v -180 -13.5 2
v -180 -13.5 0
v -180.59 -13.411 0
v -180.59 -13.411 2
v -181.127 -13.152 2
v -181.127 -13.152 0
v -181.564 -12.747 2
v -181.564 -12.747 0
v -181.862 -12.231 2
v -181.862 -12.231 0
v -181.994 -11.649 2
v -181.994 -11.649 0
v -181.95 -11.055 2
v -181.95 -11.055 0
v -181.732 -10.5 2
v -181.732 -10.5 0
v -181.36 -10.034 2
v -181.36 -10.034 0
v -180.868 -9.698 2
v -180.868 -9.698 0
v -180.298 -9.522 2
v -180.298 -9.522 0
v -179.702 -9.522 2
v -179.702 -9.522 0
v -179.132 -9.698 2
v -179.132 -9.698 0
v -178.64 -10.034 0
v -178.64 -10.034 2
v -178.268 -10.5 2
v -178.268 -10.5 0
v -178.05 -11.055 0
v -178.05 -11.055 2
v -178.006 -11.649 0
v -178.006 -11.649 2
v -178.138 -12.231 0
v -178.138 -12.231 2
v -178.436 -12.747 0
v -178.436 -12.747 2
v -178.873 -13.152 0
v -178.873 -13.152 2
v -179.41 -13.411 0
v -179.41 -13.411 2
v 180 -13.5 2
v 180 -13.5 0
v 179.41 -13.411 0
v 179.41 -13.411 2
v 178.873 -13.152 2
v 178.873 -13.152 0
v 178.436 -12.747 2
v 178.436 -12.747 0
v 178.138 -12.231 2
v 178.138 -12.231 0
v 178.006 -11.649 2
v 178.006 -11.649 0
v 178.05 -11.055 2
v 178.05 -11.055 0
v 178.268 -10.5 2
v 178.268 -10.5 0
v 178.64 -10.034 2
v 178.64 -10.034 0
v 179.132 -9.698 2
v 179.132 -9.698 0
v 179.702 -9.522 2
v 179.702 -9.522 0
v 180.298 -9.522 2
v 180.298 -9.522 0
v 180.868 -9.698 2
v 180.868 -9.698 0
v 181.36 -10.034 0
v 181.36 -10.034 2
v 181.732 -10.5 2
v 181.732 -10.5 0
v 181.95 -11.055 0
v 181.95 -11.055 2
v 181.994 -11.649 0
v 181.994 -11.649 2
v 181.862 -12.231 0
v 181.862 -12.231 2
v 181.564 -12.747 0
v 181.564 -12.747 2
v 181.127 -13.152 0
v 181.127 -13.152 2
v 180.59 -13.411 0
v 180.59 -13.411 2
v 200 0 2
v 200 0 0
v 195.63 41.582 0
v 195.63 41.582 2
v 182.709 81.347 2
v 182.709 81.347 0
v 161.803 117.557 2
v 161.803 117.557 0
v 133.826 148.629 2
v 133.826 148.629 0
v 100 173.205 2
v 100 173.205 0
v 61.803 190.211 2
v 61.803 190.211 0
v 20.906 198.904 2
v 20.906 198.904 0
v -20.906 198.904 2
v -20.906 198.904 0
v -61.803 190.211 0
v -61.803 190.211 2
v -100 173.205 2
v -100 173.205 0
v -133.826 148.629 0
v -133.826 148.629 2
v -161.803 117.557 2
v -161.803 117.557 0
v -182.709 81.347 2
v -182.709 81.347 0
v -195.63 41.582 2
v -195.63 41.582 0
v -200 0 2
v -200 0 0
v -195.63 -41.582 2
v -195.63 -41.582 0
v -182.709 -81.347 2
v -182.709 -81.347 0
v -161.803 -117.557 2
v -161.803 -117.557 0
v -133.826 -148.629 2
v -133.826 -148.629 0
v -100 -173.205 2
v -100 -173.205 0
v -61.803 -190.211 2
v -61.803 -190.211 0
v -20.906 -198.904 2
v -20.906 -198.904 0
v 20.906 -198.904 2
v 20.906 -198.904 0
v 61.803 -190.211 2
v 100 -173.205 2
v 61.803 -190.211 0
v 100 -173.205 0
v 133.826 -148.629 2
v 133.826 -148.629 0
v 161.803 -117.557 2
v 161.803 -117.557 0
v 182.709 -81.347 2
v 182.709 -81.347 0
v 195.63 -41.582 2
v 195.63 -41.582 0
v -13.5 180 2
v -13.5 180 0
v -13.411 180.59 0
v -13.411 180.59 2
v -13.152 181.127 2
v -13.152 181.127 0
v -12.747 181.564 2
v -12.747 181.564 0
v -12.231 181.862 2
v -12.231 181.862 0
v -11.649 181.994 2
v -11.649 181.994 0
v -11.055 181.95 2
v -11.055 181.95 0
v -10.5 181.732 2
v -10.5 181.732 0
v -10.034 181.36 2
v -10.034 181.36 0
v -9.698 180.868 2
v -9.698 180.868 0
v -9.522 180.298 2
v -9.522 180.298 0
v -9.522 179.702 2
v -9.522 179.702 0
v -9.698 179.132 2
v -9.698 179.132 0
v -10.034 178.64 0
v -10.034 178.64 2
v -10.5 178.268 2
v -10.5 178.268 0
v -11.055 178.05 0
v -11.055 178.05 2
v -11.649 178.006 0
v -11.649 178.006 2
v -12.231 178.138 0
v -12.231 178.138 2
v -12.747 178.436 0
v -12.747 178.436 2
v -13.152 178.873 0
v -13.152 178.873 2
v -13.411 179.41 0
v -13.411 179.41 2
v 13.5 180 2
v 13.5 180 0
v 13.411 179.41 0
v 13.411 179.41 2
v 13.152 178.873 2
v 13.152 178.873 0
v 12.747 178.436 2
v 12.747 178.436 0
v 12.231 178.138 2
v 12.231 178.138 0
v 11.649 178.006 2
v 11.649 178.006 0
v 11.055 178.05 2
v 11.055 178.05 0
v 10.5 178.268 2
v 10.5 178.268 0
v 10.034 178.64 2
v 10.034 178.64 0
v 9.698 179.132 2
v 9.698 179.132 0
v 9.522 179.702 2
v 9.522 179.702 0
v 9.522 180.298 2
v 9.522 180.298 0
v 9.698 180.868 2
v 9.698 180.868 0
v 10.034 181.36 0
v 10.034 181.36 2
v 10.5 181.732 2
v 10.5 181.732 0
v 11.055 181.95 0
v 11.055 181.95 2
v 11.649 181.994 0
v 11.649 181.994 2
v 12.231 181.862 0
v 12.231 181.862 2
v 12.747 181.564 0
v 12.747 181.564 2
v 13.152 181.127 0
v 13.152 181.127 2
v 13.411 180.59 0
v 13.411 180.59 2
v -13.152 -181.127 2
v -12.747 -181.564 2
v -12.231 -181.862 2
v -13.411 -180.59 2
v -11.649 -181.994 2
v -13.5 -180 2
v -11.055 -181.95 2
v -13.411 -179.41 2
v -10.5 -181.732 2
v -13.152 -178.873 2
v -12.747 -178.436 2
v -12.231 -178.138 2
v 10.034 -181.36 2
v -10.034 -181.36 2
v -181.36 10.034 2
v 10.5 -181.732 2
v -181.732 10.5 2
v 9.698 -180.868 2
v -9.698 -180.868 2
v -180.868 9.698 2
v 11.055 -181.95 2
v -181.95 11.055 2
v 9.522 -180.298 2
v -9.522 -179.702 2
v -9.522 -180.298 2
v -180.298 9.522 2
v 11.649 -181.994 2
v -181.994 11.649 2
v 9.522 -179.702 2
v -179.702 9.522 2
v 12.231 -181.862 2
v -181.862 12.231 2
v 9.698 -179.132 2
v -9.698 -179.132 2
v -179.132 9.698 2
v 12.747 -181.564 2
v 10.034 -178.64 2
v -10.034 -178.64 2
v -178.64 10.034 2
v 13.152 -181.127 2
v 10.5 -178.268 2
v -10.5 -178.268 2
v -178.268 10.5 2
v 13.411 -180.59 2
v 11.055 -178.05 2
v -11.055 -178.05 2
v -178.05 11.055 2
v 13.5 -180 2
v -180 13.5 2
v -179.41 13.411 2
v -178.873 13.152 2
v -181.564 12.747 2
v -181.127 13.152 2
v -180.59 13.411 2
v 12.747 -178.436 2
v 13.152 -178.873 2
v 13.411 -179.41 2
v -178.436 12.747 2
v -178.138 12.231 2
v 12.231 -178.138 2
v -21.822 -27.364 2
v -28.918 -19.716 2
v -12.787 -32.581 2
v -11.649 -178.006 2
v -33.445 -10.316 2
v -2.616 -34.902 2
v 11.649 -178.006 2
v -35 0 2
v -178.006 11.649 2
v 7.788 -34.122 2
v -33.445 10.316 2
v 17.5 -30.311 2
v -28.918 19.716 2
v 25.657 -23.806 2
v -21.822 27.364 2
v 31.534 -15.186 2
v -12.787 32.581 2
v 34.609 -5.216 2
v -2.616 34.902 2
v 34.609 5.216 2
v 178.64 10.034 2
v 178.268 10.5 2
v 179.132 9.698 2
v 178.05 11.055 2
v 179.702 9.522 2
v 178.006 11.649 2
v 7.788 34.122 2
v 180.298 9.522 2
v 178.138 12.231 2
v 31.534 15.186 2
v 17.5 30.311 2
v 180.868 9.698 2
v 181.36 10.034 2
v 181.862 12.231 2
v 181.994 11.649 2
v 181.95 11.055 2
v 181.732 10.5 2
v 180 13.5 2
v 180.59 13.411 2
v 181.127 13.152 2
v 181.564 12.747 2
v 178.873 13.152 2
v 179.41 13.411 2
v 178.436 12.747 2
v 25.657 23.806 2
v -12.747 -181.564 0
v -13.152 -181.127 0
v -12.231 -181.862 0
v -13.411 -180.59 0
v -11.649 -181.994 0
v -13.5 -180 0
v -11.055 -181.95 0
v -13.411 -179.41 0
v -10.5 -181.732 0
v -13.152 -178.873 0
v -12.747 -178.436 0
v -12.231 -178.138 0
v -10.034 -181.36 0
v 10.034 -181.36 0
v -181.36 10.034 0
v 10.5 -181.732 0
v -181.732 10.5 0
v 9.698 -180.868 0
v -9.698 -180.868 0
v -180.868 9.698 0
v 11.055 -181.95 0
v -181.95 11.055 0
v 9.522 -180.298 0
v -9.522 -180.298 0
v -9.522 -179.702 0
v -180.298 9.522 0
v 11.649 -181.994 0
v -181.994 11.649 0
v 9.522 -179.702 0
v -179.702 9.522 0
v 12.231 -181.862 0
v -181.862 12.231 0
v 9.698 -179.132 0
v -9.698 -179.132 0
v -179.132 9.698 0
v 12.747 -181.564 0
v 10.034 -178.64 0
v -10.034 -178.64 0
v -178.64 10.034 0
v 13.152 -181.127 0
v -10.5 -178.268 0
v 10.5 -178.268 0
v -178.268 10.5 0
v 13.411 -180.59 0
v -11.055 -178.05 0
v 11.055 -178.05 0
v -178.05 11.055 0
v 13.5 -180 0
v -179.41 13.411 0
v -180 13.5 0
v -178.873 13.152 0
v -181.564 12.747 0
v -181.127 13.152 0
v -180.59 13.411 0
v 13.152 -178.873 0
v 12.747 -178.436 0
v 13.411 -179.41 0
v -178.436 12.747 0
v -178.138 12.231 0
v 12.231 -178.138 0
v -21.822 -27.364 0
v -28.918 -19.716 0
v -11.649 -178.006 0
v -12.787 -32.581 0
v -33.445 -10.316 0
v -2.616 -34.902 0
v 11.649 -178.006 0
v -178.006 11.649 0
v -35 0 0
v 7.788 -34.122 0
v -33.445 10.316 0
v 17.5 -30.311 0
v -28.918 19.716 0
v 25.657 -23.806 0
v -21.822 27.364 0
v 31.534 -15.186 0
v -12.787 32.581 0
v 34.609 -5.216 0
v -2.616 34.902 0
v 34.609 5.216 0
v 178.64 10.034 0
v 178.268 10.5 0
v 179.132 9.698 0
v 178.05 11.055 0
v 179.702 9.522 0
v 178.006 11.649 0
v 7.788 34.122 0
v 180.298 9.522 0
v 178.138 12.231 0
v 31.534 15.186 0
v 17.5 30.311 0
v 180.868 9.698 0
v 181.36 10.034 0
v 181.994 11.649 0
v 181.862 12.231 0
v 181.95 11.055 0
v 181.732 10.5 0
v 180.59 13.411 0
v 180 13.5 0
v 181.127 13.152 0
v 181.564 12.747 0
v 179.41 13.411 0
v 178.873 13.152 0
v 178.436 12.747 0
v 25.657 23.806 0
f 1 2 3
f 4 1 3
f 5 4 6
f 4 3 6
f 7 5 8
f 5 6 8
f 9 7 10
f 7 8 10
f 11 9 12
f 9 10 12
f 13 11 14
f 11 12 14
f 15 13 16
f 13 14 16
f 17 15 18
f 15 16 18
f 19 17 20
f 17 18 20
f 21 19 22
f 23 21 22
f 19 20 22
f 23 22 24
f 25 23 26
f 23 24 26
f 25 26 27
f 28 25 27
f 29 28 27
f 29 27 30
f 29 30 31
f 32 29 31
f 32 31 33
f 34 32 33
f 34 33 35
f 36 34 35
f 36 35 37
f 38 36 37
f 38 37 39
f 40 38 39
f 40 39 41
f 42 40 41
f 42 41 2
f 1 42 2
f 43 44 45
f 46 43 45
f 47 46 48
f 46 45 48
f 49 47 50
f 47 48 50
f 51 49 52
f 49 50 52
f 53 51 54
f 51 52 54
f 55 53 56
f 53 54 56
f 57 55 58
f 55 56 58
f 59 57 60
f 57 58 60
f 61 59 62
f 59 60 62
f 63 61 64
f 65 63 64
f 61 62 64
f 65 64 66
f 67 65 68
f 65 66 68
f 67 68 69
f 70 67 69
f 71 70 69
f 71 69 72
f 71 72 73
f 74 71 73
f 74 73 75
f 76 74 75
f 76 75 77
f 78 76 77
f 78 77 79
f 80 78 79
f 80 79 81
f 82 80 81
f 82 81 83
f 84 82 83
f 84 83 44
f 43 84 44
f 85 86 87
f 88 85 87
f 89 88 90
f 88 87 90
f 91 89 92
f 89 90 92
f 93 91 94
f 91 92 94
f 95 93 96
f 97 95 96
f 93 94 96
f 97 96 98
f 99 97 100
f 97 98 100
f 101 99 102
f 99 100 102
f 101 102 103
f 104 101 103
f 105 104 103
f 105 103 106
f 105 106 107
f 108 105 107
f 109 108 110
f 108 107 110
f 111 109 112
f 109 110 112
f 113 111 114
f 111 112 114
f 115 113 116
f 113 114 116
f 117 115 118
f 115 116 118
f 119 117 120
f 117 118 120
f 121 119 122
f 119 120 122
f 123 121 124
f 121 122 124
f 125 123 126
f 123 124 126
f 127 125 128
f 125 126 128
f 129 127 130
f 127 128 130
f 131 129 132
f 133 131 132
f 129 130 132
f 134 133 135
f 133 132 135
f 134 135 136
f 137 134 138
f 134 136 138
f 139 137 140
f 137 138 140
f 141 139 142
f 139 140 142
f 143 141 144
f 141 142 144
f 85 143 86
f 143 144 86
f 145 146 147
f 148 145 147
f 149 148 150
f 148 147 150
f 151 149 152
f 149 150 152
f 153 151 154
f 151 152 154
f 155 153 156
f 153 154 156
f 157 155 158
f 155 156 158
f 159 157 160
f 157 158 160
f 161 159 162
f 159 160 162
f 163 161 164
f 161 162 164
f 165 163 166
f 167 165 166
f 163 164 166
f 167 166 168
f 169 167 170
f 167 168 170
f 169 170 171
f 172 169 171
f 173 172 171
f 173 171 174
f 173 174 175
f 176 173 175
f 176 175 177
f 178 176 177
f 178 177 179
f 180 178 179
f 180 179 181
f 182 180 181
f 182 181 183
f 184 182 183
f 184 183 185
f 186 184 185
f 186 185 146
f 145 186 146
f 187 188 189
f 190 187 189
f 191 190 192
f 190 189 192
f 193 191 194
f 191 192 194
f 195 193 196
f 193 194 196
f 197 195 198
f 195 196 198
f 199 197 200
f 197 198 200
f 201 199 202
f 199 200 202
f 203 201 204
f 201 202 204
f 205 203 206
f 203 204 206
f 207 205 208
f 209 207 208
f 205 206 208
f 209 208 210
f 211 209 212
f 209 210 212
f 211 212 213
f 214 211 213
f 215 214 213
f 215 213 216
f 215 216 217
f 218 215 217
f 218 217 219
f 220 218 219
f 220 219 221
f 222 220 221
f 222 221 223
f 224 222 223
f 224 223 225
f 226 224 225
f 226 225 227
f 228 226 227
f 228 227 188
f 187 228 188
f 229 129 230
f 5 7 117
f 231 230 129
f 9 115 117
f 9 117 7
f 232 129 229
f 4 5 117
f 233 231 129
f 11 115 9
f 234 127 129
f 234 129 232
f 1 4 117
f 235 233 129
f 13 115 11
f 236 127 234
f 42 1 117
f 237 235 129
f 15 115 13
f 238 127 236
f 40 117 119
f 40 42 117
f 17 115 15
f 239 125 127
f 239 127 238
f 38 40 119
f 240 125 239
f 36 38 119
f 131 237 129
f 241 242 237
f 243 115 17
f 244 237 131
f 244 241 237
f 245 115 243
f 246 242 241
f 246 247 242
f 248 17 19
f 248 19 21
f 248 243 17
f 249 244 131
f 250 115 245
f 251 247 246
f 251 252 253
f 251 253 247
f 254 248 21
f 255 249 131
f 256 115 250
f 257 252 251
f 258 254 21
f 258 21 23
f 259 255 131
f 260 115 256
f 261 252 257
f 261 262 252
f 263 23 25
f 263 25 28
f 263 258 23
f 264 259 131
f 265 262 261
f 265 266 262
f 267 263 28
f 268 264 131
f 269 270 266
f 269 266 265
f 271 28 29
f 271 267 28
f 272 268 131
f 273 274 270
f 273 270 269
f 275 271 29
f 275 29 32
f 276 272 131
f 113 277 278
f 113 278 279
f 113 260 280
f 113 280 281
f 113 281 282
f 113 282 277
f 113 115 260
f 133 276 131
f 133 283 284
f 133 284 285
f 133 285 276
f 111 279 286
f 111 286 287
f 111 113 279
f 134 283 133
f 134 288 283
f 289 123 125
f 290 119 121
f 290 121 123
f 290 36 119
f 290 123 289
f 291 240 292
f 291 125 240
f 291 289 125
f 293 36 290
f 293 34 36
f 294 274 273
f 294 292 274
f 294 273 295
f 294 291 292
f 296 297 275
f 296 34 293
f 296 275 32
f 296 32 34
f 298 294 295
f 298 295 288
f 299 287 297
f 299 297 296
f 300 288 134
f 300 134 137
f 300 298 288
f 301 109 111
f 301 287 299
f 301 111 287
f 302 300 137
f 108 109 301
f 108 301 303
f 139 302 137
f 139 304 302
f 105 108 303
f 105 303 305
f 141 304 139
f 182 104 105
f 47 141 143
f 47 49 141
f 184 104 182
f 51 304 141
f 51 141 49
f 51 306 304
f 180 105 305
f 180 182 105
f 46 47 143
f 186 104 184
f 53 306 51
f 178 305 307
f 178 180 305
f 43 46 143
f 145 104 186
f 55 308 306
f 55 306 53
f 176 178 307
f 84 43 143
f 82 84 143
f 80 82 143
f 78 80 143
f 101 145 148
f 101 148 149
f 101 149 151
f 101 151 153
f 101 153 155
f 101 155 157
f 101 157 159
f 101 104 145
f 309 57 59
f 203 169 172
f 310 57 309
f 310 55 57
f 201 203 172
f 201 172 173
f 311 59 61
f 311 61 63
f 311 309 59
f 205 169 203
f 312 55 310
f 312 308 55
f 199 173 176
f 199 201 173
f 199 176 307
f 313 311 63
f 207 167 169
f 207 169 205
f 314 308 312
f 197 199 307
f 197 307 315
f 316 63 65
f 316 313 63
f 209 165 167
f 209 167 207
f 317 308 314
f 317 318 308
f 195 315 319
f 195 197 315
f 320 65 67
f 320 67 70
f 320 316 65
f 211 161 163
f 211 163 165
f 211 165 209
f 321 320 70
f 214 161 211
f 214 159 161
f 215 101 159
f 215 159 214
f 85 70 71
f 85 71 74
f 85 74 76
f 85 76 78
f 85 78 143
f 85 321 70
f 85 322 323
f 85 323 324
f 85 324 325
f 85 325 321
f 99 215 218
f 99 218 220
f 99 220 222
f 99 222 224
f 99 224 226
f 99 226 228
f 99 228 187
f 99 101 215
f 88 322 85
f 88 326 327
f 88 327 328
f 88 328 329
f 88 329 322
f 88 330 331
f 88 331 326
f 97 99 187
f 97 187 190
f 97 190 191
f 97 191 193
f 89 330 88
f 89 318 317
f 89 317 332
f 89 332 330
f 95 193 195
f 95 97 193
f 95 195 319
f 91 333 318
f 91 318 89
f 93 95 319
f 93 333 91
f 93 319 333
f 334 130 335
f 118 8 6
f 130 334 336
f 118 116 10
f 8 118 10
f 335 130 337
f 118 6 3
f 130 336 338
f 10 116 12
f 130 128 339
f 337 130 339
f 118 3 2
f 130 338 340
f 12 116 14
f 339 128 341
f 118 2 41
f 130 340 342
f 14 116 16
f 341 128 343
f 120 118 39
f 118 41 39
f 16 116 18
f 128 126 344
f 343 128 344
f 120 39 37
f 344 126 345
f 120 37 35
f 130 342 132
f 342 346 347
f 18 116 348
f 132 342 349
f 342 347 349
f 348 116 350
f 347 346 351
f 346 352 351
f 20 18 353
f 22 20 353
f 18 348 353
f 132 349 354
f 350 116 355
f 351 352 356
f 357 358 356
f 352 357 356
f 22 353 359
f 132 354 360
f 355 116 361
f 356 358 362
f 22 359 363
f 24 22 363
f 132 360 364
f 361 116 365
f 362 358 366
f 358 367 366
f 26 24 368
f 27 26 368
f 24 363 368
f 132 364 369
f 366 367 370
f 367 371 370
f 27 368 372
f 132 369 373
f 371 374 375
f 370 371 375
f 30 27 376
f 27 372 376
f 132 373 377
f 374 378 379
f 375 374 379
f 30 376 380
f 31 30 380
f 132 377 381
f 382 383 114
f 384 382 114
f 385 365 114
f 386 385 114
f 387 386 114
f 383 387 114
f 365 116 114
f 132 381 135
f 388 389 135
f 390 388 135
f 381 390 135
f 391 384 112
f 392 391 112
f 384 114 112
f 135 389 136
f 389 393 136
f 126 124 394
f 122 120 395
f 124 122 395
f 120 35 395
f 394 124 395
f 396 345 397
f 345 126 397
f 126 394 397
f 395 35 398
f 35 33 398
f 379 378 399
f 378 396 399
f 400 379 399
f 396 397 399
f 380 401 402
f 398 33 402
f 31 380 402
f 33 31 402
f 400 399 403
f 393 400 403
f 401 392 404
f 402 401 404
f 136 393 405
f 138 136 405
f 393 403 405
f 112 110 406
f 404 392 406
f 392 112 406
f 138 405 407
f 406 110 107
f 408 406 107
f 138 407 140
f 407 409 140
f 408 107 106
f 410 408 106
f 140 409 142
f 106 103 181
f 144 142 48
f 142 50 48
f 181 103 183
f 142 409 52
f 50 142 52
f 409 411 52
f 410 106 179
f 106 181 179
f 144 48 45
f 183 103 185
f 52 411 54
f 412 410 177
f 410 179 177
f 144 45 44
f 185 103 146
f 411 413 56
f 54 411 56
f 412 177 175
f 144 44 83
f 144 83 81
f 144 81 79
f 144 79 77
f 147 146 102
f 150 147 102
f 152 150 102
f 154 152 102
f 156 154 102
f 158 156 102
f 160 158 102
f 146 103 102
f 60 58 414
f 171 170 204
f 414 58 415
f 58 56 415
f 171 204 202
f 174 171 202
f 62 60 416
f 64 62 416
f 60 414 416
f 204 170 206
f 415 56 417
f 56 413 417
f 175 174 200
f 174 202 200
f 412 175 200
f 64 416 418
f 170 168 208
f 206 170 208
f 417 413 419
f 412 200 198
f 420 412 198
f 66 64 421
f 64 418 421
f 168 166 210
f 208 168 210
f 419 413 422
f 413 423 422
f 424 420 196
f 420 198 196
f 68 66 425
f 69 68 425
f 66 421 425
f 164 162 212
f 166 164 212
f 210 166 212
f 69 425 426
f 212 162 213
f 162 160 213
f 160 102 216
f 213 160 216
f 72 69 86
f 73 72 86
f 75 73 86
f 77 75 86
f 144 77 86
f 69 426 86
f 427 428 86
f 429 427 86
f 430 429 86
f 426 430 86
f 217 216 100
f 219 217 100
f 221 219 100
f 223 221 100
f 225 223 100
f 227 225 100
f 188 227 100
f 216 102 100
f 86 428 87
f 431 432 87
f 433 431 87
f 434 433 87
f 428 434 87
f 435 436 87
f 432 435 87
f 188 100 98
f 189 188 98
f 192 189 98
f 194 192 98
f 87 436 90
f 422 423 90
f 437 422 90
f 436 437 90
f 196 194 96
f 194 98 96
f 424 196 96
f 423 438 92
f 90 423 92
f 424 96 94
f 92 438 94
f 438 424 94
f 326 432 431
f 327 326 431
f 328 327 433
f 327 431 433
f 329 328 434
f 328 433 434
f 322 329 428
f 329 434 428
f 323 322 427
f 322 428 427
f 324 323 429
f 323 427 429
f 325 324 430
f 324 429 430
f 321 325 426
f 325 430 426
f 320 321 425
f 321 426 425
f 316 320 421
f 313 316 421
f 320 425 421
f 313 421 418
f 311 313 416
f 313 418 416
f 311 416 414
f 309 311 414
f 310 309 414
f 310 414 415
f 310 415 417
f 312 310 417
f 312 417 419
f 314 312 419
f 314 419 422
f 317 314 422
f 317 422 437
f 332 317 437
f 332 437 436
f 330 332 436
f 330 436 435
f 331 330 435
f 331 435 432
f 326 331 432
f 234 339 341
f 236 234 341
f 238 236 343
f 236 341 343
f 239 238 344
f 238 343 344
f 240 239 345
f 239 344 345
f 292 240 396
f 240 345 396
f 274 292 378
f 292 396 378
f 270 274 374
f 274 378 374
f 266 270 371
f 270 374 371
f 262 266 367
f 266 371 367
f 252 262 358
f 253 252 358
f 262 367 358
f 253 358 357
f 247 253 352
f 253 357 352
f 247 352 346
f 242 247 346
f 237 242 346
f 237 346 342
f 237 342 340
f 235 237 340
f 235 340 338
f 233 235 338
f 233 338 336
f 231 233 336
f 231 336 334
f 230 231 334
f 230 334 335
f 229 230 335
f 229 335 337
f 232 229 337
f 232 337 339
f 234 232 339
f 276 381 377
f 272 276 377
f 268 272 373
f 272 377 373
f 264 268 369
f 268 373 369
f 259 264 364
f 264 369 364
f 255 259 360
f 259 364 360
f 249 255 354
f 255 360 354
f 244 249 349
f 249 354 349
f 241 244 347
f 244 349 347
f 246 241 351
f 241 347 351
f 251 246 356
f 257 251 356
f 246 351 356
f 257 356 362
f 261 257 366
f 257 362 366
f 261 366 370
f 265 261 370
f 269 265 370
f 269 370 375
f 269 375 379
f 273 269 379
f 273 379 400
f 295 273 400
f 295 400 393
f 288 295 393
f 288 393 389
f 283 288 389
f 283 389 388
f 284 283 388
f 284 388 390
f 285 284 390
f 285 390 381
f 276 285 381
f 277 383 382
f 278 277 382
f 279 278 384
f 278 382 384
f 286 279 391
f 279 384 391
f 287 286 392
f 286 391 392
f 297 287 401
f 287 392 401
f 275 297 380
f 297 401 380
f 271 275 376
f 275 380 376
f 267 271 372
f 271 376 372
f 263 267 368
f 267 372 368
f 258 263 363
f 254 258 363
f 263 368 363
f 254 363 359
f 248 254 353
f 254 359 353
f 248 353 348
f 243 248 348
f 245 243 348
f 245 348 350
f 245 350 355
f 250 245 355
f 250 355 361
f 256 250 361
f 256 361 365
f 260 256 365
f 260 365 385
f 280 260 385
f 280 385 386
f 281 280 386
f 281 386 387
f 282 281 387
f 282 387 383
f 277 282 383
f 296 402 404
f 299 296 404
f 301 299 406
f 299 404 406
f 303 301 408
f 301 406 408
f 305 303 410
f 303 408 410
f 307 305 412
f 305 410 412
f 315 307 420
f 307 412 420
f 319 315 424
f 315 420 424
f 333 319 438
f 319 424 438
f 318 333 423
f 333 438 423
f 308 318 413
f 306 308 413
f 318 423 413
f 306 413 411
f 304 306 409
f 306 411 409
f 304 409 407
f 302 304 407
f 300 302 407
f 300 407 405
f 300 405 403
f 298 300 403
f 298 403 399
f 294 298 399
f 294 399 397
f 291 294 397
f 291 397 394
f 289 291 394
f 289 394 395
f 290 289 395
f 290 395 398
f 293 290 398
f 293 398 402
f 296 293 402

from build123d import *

# Parameters (mm, degrees)
SKETCH1_R           = 200
BOSS_EXTRUDE1_DEPTH = 2
SKETCH2_R           = 2
CUT_EXTRUDE1_DEPTH  = 13
CIRPATTERN1_COUNT   = 4
SKETCH4_R           = 35
CUT_EXTRUDE3_DEPTH  = 283.849783454


with BuildPart() as part:
    # Sketch1 → Boss-Extrude1 (new body)
    with BuildSketch(Plane.XY):
        Circle(SKETCH1_R)
    extrude(amount=BOSS_EXTRUDE1_DEPTH)

    # Sketch2 → Cut-Extrude1 (cut)
    with BuildSketch(Plane(origin=(0, 0, 0), x_dir=(-1, 0, 0), z_dir=(0, 0, -1))):
        with Locations((11.5, 180)):
            Circle(SKETCH2_R)
        with Locations(Location((-11.5, 180, 0), (0, 0, 180))):
            Circle(SKETCH2_R)
    cut_extrude1 = extrude(amount=-CUT_EXTRUDE1_DEPTH, mode=Mode.SUBTRACT)

    # CirPattern1: Cut-Extrude1 ×4 about axis
    cirpattern1_axis = Axis((0, 0, 0), (0, 0, 1))
    for i in range(1, CIRPATTERN1_COUNT):
        add(cut_extrude1.rotate(cirpattern1_axis, i * 360 / CIRPATTERN1_COUNT), mode=Mode.SUBTRACT)

    # Sketch4 → Cut-Extrude3 (cut, through all)
    with BuildSketch(Plane(origin=(0, 0, 0), x_dir=(-1, 0, 0), z_dir=(0, 0, -1))):
        Circle(SKETCH4_R)
    extrude(amount=-CUT_EXTRUDE3_DEPTH, mode=Mode.SUBTRACT)


solid = part.part
